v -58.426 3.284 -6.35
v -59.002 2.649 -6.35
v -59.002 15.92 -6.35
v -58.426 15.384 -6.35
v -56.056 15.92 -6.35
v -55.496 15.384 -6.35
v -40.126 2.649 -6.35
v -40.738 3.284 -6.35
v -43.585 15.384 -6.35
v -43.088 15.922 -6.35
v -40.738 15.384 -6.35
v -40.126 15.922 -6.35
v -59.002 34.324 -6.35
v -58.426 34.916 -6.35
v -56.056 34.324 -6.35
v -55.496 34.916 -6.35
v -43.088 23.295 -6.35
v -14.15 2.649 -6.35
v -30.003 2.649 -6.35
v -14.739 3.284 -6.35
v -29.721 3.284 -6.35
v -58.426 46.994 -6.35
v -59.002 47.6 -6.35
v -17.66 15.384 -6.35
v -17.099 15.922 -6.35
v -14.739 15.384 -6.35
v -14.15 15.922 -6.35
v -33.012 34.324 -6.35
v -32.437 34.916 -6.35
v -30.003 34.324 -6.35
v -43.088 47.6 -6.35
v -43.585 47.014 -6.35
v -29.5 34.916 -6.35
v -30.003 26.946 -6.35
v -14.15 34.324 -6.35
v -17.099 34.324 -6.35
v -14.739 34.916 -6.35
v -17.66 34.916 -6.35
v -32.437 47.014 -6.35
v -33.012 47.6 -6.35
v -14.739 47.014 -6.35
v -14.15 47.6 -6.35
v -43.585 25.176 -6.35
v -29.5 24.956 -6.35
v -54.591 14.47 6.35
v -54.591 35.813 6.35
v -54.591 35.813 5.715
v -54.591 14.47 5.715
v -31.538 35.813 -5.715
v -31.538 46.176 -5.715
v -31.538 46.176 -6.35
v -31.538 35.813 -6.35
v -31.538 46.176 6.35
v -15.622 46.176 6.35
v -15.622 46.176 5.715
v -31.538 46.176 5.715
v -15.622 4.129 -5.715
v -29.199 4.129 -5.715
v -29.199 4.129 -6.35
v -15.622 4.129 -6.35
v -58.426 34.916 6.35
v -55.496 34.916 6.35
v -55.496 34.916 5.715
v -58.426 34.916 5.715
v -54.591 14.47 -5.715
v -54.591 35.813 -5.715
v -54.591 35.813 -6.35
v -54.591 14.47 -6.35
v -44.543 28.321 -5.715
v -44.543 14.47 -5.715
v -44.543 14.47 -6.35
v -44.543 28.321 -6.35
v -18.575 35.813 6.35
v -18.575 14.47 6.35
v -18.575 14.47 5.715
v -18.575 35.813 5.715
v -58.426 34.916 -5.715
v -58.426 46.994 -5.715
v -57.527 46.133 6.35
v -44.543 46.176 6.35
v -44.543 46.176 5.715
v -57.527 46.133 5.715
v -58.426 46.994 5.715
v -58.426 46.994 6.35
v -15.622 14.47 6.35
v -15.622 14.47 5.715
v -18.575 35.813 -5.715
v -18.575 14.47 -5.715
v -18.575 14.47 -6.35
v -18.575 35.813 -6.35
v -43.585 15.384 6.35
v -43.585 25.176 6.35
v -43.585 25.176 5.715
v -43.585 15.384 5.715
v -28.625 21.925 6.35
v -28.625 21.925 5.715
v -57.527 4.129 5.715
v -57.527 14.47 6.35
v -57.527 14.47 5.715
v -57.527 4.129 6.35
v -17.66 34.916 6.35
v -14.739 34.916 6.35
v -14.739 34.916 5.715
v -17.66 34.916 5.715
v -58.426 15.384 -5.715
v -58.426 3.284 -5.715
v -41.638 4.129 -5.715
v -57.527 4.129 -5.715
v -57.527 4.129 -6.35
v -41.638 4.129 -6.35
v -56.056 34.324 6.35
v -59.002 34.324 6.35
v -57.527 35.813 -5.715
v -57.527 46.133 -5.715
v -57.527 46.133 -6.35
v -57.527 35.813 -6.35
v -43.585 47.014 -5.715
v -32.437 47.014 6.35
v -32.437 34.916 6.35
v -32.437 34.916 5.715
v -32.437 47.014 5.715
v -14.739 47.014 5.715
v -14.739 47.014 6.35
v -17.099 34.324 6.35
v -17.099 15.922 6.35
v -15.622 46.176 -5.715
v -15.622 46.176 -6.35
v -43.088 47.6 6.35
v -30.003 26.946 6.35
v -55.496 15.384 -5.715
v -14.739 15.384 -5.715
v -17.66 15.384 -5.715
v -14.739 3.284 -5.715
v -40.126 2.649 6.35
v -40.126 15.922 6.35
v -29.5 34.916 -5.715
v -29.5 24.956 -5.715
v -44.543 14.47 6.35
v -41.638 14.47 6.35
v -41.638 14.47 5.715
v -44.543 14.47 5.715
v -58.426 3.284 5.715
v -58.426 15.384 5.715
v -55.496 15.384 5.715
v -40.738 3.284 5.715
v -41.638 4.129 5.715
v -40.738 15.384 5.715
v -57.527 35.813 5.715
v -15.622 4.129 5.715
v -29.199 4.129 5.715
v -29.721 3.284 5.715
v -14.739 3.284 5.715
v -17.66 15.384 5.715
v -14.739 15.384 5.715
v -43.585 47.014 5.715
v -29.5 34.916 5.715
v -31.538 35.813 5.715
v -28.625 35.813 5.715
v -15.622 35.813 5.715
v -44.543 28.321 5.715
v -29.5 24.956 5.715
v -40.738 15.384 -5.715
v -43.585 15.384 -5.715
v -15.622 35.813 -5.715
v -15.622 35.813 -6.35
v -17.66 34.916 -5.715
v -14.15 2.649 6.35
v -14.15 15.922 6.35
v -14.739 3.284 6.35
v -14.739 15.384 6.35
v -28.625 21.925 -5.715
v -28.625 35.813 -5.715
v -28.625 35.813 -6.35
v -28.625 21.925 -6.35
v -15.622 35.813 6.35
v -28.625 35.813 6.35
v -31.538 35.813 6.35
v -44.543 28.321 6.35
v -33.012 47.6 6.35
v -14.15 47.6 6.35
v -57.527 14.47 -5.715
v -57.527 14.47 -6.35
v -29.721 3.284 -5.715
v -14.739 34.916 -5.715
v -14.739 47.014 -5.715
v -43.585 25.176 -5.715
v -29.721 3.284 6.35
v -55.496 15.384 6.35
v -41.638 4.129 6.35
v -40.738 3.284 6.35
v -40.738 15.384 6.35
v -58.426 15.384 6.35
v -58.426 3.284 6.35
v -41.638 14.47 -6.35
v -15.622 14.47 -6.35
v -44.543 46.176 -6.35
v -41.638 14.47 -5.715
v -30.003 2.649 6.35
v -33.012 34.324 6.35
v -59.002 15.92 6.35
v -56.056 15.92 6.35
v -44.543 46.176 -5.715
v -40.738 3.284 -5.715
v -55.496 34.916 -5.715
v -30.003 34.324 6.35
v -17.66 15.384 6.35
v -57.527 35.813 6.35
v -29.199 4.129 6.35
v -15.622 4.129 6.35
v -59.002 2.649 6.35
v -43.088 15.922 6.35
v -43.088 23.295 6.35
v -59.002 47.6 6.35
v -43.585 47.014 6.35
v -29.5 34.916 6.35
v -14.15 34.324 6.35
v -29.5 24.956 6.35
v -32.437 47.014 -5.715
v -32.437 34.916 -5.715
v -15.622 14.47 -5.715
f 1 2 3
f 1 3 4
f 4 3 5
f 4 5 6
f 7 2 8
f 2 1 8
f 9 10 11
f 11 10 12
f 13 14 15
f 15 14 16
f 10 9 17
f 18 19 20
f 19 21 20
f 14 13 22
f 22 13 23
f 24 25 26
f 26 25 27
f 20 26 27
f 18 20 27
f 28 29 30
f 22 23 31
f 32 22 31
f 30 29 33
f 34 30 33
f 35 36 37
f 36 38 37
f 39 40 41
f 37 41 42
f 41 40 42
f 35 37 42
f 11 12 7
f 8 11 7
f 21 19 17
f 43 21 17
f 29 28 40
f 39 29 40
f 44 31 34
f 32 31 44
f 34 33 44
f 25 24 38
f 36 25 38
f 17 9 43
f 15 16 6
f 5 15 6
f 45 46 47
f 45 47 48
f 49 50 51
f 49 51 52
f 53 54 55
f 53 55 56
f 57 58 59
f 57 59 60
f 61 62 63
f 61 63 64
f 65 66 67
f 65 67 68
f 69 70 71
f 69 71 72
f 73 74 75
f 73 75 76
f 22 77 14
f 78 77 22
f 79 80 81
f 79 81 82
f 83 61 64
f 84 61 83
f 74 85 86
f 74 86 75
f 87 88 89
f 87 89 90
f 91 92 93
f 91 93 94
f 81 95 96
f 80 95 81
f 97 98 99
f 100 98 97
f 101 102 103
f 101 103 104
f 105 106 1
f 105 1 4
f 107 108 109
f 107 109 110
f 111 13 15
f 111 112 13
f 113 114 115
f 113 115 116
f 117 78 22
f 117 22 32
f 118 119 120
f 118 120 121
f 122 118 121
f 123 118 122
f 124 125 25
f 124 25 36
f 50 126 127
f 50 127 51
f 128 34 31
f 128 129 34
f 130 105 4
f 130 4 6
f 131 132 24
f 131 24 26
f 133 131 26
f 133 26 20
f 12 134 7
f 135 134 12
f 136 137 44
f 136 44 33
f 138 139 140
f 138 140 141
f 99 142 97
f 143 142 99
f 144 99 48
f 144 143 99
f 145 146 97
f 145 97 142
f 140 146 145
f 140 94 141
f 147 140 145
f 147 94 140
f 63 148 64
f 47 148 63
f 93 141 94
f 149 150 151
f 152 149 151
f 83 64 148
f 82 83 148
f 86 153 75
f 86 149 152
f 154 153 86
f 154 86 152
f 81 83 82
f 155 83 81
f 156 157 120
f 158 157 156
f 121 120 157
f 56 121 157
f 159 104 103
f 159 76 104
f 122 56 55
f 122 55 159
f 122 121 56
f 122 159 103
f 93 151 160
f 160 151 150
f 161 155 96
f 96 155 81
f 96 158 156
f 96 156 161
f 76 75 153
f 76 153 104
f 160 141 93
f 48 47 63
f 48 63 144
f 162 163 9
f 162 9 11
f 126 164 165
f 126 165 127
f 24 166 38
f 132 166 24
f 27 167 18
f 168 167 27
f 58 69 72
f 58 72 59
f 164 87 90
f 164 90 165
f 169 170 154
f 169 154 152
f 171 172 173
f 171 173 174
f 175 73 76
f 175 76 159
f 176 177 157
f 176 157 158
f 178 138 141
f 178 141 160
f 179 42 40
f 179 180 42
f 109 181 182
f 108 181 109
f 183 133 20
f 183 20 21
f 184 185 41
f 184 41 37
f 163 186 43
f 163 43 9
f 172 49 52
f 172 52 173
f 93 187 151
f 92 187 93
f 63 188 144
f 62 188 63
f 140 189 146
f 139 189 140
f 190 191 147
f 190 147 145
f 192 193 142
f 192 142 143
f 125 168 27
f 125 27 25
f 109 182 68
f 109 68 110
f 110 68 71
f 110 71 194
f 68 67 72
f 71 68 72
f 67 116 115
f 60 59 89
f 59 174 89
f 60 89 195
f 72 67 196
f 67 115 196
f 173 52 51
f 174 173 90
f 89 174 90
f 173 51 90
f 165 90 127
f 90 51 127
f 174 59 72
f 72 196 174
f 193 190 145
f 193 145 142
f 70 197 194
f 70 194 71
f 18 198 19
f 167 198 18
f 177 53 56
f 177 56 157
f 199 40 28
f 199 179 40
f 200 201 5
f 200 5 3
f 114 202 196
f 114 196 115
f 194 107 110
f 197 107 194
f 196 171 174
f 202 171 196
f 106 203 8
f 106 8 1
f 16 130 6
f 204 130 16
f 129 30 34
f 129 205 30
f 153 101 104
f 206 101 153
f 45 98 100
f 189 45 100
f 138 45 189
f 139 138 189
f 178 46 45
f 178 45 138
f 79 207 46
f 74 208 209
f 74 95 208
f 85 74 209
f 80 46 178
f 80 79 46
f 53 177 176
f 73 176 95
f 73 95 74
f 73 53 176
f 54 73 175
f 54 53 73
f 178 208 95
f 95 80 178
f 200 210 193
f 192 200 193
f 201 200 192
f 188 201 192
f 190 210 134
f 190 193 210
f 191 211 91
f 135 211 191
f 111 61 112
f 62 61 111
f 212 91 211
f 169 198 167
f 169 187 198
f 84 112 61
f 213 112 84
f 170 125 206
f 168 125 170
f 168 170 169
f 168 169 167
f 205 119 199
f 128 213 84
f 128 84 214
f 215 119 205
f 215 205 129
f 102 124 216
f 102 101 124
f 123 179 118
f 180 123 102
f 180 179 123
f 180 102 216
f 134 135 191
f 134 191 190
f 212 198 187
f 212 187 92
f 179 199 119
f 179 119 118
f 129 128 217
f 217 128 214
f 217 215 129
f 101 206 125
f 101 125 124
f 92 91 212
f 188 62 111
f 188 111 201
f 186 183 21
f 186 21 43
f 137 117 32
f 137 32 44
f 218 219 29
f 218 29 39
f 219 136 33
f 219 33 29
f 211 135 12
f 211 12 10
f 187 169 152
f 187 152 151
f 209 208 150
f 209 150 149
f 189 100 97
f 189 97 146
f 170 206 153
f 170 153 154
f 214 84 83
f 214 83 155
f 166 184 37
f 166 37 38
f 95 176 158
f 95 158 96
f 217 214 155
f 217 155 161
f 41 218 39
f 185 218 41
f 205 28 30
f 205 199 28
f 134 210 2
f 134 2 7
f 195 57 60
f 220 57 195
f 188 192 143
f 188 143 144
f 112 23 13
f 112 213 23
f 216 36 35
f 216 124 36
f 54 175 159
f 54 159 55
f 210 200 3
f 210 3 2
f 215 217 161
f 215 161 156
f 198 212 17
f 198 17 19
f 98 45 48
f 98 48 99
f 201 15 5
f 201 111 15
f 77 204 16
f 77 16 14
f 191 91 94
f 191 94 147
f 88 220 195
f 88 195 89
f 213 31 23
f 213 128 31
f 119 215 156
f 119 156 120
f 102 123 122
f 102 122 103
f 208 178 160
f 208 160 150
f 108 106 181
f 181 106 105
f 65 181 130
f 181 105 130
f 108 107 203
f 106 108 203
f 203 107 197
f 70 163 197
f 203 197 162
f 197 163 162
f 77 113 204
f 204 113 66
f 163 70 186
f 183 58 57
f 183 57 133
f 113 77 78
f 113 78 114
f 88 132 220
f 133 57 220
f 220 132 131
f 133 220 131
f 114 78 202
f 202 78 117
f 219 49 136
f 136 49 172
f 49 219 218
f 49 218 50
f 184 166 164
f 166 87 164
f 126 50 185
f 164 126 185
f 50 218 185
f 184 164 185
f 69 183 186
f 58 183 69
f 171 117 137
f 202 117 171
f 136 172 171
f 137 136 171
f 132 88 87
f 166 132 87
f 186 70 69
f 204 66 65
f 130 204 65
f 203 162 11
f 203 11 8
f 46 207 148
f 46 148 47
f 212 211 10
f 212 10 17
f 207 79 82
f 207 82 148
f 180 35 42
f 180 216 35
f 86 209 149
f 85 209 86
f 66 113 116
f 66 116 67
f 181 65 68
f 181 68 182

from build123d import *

# Parameters (mm, degrees)
F3_DEPTH = 6.35
F4_DEPTH = 5.715


with BuildPart() as f3:
    # F2 (on face) → F3 (new body, symmetric)
    with BuildSketch(Plane.XY):
        Polygon((-44.5433743298, 46.1763069034), (-57.5266592205, 46.1332164705), (-57.5266592205, 35.8126908541), (-54.5913651586, 35.8126908541), (-54.5913651586, 14.4700501114), (-57.5266592205, 14.4700501114), (-57.5266592205, 4.1293082759), (-41.6378863156, 4.1293082759), (-41.6378863156, 14.4700501114), (-44.5433743298, 14.4700501114), (-44.5433743298, 28.3214543015), (-29.1992705315, 4.1293082759), (-15.6220048666, 4.1293082759), (-15.6220048666, 14.4700501114), (-18.5752976686, 14.4700501114), (-18.5752976686, 35.8126908541), (-15.6220048666, 35.8126908541), (-15.6220048666, 46.1763069034), (-31.5383896232, 46.1763069034), (-31.5383896232, 35.8126908541), (-28.6253094673, 35.8126908541), (-28.6253094673, 21.92475833), align=None)
    extrude(amount=F3_DEPTH, both=True)



with BuildPart() as f3b:
    # F1 (on face) → F3, piece 2 (new body, symmetric)
    with BuildSketch(Plane.XY):
        Polygon((-56.0555362153, 34.3240606943), (-56.0555362153, 15.9201806872), (-59.0018344771, 15.9201806872), (-59.0018344771, 2.6492023655), (-40.1264553645, 2.6492023655), (-40.1264553645, 15.9219650984), (-43.0878697398, 15.9219650984), (-43.0878697398, 23.2951258444), (-30.0034182126, 2.6492023655), (-14.1497837651, 2.6492023655), (-14.1497837651, 15.9219650984), (-17.0993286024, 15.9219650984), (-17.0993286024, 34.3240606943), (-14.1497837651, 34.3240606943), (-14.1497837651, 47.5996589474), (-33.0122411207, 47.5996589474), (-33.0122411207, 34.3240606943), (-30.0034182126, 34.3240606943), (-30.0034182126, 26.9455498071), (-43.0878697398, 47.5996589474), (-59.0018344771, 47.5996589474), (-59.0018344771, 34.3240606943), align=None)
        Polygon((-58.4264323115, 34.9163971841), (-58.4264323115, 46.9940491021), (-43.5850694776, 47.013964504), (-29.5001640916, 24.9555353075), (-29.5001640916, 34.9163971841), (-32.4371978641, 34.9163971841), (-32.4371978641, 47.013964504), (-14.7387757897, 47.013964504), (-14.7387757897, 34.9163971841), (-17.6595617086, 34.9163971841), (-17.6595617086, 15.3841460124), (-14.7387757897, 15.3841460124), (-14.7387757897, 3.2841966022), (-29.7212973237, 3.2841966022), (-43.5850694776, 25.176089257), (-43.5850694776, 15.3841460124), (-40.7384447753, 15.3841460124), (-40.7384447753, 3.2841966022), (-58.4264323115, 3.2841966022), (-58.4264323115, 15.3841460124), (-55.4955154657, 15.3841460124), (-55.4955154657, 34.9163971841), align=None, mode=Mode.SUBTRACT)
    extrude(amount=F3_DEPTH, both=True)


with BuildPart() as f3_1:
    add(f3.part)

    add(f3b.part)  # F4 merges F3b
    # F2 (on face) → F4 (join, symmetric)
    with BuildSketch(Plane.XY):
        Polygon((-58.4264323115, 46.9940491021), (-58.4264323115, 34.9163971841), (-55.4955154657, 34.9163971841), (-55.4955154657, 15.3841460124), (-58.4264323115, 15.3841460124), (-58.4264323115, 3.2841966022), (-40.7384447753, 3.2841966022), (-40.7384447753, 15.3841460124), (-43.5850694776, 15.3841460124), (-43.5850694776, 25.176089257), (-29.7212973237, 3.2841966022), (-14.7387757897, 3.2841966022), (-14.7387757897, 15.3841460124), (-17.6595617086, 15.3841460124), (-17.6595617086, 34.9163971841), (-14.7387757897, 34.9163971841), (-14.7387757897, 47.013964504), (-32.4371978641, 47.013964504), (-32.4371978641, 34.9163971841), (-29.5001640916, 34.9163971841), (-29.5001640916, 24.9555353075), (-43.5850694776, 47.013964504), align=None)
        Polygon((-57.5266592205, 35.8126908541), (-57.5266592205, 46.1332164705), (-44.5433743298, 46.1763069034), (-28.6253094673, 21.92475833), (-28.6253094673, 35.8126908541), (-31.5383896232, 35.8126908541), (-31.5383896232, 46.1763069034), (-15.6220048666, 46.1763069034), (-15.6220048666, 35.8126908541), (-18.5752976686, 35.8126908541), (-18.5752976686, 14.4700501114), (-15.6220048666, 14.4700501114), (-15.6220048666, 4.1293082759), (-29.1992705315, 4.1293082759), (-44.5433743298, 28.3214543015), (-44.5433743298, 14.4700501114), (-41.6378863156, 14.4700501114), (-41.6378863156, 4.1293082759), (-57.5266592205, 4.1293082759), (-57.5266592205, 14.4700501114), (-54.5913651586, 14.4700501114), (-54.5913651586, 35.8126908541), align=None, mode=Mode.SUBTRACT)
    extrude(amount=F4_DEPTH, both=True)


solid = f3_1.part
